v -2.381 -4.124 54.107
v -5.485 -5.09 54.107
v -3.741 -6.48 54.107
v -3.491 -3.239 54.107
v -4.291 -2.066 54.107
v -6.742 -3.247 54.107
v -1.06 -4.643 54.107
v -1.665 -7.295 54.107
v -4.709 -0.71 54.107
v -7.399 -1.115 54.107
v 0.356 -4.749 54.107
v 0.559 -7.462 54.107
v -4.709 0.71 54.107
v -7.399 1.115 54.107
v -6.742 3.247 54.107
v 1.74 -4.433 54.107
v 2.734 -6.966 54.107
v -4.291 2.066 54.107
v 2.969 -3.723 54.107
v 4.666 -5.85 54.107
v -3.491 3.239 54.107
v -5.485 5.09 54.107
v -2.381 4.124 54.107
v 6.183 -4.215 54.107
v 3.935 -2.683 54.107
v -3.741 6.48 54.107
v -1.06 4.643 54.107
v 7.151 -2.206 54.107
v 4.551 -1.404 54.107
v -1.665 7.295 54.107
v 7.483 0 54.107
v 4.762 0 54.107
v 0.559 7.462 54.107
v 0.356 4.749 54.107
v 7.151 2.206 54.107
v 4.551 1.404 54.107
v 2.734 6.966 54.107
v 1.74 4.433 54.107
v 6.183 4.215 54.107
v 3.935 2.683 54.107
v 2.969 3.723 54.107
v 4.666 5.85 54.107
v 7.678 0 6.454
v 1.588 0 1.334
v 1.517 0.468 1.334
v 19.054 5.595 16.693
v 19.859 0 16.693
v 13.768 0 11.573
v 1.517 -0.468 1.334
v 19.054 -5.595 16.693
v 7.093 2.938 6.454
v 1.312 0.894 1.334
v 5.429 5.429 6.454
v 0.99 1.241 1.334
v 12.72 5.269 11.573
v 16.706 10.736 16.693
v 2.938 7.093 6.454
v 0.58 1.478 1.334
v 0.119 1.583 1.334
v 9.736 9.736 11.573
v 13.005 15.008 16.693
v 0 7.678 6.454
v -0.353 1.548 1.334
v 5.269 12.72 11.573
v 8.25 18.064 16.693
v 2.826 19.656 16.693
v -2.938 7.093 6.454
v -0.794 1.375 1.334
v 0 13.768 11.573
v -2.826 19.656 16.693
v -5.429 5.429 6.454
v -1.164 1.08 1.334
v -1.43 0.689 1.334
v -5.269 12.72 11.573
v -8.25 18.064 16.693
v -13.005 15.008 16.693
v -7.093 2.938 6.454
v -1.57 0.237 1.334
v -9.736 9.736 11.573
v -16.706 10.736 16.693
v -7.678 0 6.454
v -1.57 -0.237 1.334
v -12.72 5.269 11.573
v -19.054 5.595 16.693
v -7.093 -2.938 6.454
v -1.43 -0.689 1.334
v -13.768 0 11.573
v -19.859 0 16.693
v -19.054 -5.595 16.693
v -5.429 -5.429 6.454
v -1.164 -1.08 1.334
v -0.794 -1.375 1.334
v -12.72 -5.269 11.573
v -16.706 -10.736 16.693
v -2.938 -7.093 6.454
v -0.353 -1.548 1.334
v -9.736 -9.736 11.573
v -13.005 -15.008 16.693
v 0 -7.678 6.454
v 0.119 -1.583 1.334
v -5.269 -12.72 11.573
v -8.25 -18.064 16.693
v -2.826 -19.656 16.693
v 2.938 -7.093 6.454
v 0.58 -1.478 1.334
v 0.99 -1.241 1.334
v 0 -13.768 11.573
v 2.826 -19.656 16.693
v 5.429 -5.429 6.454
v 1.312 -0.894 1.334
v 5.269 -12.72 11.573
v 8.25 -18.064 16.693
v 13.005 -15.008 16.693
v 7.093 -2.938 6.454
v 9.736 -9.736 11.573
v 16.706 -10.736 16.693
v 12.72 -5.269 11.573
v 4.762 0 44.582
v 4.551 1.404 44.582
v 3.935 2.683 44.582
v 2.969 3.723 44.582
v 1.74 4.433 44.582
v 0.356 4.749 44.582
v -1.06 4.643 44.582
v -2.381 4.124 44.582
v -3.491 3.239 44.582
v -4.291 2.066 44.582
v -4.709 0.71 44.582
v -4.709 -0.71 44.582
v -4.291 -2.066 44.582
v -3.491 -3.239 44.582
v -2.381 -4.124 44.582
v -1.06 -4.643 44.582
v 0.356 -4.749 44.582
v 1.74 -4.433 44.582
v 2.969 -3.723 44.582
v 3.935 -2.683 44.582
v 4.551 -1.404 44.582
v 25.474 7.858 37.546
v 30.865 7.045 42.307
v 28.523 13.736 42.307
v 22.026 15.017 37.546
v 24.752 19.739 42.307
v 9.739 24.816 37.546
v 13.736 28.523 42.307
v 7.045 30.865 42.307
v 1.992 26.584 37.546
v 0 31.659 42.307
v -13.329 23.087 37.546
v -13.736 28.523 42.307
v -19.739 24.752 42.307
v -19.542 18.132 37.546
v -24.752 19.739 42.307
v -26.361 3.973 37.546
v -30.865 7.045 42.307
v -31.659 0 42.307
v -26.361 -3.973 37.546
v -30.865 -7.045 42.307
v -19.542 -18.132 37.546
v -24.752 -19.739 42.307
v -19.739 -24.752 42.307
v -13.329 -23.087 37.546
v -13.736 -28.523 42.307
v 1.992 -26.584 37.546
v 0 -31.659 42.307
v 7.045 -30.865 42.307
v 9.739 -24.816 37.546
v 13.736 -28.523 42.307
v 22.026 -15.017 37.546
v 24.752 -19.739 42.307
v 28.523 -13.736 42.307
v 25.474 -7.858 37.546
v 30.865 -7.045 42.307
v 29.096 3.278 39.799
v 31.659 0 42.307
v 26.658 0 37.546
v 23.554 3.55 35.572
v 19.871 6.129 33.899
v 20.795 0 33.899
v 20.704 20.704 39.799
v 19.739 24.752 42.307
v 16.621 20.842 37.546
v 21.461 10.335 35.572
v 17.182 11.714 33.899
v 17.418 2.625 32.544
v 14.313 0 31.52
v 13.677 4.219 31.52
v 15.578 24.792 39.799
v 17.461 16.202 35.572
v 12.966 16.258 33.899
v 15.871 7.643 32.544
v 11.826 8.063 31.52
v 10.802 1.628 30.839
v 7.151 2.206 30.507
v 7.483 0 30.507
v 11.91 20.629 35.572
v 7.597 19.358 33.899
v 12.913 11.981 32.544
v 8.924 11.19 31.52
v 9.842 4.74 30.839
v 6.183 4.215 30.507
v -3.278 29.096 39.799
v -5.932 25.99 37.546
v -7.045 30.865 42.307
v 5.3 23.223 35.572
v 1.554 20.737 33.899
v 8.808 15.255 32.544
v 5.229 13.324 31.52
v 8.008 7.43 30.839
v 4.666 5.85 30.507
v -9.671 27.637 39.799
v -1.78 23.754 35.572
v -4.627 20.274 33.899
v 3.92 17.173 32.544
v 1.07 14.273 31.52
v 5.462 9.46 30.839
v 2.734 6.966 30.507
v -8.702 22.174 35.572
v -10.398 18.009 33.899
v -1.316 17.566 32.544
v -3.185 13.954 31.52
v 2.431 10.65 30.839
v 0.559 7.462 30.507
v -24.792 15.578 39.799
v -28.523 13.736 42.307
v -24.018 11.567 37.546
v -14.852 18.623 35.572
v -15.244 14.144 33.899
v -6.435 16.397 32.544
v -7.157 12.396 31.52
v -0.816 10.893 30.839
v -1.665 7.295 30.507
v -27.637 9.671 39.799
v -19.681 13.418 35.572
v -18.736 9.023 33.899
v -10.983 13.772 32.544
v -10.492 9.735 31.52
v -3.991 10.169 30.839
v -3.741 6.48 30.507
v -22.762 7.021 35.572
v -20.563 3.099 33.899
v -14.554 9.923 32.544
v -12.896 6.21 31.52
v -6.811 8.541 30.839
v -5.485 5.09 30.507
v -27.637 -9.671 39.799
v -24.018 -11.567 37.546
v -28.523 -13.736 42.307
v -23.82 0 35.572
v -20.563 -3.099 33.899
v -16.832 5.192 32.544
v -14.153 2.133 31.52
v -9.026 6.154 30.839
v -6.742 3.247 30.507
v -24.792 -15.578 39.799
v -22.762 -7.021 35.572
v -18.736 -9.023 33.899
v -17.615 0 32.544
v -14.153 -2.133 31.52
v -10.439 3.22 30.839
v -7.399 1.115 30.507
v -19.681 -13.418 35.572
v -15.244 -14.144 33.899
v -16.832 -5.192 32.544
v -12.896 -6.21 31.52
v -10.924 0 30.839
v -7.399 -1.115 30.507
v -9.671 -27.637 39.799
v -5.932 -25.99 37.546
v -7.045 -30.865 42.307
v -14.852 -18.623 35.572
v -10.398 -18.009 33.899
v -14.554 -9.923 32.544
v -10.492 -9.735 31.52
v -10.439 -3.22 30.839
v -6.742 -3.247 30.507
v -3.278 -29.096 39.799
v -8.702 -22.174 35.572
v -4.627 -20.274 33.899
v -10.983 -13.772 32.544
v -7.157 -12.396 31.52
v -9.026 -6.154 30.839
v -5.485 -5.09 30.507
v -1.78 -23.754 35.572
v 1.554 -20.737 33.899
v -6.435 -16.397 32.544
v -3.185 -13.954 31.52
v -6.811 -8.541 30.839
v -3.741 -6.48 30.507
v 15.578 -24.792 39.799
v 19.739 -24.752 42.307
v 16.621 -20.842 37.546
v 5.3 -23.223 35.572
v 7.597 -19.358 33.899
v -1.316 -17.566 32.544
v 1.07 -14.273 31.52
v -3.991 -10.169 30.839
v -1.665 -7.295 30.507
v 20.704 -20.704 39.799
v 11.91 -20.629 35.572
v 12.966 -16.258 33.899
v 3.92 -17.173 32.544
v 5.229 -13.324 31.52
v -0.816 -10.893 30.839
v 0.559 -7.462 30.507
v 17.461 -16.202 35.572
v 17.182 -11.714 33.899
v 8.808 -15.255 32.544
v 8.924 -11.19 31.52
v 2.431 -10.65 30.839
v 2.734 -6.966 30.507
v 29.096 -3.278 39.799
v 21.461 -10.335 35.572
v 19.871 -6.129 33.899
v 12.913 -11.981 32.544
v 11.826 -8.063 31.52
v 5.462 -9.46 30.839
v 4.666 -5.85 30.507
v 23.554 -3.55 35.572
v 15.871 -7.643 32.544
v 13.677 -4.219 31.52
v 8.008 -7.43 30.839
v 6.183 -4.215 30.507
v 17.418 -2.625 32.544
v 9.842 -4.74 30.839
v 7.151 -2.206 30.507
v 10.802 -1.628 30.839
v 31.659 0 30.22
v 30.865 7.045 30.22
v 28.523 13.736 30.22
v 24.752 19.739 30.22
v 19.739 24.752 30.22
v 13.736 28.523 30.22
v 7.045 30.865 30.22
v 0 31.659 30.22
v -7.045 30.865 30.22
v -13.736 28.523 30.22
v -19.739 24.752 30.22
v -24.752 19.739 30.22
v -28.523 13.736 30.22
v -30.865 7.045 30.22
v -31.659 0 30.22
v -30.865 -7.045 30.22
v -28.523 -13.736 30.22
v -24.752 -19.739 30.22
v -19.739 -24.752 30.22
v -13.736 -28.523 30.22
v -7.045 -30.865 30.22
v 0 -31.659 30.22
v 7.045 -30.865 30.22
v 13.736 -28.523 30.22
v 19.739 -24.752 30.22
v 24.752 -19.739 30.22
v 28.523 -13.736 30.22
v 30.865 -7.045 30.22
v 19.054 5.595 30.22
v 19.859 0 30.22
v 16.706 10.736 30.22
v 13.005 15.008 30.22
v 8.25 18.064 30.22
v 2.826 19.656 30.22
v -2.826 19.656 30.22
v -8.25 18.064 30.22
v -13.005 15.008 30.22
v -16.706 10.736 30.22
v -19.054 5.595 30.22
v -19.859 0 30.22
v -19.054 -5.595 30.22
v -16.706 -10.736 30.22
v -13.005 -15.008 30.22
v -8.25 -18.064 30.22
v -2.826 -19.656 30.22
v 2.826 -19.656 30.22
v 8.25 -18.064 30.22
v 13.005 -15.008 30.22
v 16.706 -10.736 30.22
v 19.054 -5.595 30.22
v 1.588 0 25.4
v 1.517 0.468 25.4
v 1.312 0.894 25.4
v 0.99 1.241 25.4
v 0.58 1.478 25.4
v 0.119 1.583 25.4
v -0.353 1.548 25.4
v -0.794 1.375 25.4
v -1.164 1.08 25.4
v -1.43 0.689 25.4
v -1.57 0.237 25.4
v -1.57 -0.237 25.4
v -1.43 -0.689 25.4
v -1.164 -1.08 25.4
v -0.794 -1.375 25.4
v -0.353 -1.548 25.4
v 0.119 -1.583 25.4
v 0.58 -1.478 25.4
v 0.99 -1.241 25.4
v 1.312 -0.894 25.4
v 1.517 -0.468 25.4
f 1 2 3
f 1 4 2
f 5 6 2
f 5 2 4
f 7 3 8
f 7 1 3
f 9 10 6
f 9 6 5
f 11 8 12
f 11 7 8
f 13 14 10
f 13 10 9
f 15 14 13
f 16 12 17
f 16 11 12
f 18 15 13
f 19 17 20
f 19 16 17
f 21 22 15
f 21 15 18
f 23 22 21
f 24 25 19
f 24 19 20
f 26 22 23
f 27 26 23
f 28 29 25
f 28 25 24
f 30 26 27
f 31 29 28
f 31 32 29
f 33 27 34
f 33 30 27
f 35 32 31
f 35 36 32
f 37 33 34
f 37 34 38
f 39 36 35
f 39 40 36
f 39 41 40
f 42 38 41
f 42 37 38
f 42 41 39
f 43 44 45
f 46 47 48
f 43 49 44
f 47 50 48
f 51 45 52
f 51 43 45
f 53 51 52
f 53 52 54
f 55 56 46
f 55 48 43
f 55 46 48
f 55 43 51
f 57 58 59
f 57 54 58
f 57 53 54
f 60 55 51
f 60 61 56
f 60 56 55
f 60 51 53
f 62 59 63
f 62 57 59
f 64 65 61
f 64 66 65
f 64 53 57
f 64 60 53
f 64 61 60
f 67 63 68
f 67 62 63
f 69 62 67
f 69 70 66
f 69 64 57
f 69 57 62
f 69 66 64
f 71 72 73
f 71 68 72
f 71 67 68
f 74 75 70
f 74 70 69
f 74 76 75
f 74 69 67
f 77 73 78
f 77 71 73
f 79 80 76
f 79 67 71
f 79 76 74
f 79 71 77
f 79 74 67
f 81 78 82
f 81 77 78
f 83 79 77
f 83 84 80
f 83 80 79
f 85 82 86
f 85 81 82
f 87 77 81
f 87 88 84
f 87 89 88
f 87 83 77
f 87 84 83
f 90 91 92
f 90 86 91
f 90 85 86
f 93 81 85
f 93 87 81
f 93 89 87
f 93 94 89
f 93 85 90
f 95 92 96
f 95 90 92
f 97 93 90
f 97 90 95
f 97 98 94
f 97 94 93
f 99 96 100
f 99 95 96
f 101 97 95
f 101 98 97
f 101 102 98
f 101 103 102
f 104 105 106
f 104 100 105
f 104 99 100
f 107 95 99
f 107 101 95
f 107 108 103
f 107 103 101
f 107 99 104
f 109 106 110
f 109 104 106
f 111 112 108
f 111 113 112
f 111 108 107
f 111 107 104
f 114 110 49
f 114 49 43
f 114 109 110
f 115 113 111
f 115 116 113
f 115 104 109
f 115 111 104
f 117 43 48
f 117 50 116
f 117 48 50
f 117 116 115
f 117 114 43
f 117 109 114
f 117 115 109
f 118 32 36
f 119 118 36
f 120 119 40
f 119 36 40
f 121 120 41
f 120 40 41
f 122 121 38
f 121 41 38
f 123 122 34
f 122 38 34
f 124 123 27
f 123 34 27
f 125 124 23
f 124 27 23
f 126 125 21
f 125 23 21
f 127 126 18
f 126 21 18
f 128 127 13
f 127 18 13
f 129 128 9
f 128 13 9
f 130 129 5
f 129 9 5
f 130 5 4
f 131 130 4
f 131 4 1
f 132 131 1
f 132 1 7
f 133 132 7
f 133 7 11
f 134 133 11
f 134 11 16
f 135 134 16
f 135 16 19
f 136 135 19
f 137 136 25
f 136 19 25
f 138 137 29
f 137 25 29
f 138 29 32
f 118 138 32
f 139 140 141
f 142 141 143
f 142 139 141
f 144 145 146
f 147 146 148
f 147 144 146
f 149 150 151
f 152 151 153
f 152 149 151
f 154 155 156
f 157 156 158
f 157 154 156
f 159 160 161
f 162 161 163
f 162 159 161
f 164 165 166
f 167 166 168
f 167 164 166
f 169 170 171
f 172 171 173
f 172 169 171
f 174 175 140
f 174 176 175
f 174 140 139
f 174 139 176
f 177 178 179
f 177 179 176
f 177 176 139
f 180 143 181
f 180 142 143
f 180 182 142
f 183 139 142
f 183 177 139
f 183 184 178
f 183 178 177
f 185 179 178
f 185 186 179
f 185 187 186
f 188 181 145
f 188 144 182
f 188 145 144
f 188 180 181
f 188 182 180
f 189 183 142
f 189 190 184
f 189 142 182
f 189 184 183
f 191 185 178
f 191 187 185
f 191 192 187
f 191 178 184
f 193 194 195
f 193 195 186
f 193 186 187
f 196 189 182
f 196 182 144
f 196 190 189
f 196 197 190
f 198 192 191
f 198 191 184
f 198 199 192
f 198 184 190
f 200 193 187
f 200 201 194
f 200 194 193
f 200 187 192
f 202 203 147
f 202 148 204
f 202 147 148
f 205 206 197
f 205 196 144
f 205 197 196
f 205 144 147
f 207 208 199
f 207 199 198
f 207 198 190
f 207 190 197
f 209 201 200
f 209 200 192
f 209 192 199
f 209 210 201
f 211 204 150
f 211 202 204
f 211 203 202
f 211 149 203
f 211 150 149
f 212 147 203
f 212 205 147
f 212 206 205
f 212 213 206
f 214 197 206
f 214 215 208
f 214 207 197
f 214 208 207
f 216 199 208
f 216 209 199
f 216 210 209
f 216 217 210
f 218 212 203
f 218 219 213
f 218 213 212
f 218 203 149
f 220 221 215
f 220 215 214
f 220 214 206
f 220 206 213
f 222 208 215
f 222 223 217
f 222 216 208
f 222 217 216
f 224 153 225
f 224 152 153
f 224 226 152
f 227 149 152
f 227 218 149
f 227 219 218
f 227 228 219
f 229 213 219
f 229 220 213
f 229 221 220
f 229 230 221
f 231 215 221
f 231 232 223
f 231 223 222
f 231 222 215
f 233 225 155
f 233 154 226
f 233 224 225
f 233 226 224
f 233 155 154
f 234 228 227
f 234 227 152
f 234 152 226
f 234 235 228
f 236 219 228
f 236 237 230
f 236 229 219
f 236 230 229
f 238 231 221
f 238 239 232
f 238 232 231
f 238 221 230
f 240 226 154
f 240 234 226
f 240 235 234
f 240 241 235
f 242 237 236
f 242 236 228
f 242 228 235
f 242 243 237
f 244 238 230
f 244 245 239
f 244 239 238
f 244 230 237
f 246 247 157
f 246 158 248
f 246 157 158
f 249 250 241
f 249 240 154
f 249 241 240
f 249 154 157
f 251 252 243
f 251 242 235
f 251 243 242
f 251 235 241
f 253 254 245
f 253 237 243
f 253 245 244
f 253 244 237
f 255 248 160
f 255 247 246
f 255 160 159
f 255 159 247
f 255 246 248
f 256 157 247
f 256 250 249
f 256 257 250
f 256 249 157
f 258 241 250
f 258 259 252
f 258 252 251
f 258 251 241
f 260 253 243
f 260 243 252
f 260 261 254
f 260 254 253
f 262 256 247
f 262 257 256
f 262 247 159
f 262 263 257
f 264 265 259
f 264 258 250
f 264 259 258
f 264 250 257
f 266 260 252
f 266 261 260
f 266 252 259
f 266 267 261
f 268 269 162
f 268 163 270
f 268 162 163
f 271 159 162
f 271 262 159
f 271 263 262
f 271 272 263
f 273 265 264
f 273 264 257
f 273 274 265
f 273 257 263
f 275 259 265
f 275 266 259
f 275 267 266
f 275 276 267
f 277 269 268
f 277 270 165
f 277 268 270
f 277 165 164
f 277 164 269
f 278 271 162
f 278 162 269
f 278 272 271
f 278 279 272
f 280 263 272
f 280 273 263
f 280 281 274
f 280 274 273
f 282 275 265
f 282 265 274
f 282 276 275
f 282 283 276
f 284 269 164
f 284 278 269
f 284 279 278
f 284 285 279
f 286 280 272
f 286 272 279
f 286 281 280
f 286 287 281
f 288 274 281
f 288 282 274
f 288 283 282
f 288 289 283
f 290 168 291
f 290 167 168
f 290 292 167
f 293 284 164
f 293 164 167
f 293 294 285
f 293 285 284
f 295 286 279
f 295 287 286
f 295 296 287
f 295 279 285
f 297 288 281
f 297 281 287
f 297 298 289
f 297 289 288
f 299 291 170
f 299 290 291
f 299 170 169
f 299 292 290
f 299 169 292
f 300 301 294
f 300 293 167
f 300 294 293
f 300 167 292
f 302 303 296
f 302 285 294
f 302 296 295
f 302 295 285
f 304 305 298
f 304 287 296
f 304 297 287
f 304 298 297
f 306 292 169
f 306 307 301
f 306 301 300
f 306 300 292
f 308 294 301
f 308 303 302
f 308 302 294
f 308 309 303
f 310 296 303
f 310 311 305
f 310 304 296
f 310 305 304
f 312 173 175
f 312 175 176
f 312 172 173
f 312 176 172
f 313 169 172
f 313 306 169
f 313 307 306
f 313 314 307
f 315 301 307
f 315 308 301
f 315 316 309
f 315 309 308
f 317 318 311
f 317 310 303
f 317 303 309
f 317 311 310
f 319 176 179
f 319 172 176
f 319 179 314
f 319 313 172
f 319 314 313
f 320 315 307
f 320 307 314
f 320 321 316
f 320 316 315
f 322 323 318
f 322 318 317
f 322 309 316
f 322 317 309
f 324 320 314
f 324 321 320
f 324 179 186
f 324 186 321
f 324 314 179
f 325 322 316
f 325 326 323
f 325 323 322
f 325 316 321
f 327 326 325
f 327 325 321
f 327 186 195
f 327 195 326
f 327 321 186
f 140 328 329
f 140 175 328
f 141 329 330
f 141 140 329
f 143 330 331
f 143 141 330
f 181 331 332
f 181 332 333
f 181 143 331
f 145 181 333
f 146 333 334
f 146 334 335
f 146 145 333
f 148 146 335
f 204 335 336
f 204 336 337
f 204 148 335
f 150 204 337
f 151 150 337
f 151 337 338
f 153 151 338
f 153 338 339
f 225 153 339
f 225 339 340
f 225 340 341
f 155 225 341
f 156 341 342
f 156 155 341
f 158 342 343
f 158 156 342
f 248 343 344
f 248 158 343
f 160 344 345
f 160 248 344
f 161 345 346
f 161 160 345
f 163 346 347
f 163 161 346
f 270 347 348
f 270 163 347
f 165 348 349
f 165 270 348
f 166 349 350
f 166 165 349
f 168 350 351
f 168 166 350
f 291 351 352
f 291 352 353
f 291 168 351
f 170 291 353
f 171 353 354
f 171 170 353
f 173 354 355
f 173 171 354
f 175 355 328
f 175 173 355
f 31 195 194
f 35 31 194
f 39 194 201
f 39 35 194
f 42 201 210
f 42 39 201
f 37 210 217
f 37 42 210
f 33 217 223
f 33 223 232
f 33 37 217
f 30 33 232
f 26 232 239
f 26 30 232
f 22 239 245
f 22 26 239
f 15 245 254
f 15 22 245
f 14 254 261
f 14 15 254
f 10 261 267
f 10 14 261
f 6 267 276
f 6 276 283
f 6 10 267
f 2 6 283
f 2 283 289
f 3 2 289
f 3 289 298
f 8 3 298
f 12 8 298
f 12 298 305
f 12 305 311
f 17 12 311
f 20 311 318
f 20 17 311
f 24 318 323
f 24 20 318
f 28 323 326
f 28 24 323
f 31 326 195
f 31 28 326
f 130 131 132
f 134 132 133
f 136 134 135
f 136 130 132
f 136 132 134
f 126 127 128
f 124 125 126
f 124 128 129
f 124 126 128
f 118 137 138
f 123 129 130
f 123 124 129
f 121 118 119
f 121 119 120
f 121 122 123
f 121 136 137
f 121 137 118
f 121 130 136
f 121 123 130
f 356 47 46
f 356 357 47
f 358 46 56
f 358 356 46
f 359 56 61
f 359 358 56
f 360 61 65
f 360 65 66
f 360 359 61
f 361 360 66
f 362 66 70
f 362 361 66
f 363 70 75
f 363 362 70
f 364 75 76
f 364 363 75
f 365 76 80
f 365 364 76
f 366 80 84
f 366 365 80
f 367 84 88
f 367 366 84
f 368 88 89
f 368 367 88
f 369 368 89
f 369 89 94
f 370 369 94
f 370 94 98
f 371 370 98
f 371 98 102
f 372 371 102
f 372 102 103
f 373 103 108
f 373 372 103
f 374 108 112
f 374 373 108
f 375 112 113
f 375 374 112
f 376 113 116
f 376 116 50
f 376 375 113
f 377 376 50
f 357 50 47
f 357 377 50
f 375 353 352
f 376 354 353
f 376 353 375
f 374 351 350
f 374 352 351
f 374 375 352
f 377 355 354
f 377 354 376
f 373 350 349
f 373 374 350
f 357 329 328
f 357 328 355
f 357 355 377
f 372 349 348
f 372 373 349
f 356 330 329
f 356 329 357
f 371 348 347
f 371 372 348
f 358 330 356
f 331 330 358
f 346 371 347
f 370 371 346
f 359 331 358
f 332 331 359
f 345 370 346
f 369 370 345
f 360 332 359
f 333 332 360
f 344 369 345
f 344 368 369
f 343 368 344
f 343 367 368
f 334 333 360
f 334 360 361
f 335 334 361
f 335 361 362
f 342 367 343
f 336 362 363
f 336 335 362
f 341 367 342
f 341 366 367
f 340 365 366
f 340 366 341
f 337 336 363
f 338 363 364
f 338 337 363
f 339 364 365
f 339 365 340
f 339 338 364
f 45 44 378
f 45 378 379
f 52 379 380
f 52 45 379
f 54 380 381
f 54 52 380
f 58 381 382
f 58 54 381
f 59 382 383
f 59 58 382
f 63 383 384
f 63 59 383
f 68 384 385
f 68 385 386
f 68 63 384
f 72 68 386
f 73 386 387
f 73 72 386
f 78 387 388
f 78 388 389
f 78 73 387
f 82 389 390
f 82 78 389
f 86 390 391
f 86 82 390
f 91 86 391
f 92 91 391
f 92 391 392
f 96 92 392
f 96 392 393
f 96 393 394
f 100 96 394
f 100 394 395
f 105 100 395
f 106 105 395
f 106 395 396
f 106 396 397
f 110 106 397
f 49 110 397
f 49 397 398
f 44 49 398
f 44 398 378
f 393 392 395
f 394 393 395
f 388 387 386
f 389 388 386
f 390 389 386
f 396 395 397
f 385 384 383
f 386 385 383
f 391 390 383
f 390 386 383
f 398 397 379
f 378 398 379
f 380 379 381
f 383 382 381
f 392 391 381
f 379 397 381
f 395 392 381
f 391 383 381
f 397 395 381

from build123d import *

# Parameters (mm, degrees)
F2_R     = 4.7625
F3_DEPTH = 9.525
F4_R     = 1.5875
F5_DEPTH = 25.4


with BuildPart() as f1:
    # F0 (on Front) → F1 (revolve)
    with BuildSketch(Plane.XZ):
        with BuildLine():
            Line((0, 54.107483), (0, 0))
            Line((0, 0), (19.858597, 16.692733))
            Line((19.858597, 16.692733), (19.858597, 30.219605))
            Line((19.858597, 30.219605), (31.658631, 30.219605))
            Line((31.658631, 30.219605), (31.658631, 42.307448))
            ThreePointArc((31.658631, 42.307448), (20.795094, 33.8991), (7.48295, 30.50741))
            Line((7.48295, 30.50741), (7.48295, 54.107483))
            Line((7.48295, 54.107483), (0, 54.107483))
        make_face()
    revolve(axis=Axis((0, 0, 27.053742), (0, 0, 1)))

    # F2 (on face) → F3 (cut)
    with BuildSketch(Plane.XY.offset(54.107483)):
        Circle(F2_R)
    extrude(amount=-F3_DEPTH, mode=Mode.SUBTRACT)

    # F4 (on Top) → F5 (cut)
    with BuildSketch(Plane.XY):
        Circle(F4_R)
    extrude(amount=F5_DEPTH, mode=Mode.SUBTRACT)


solid = f1.part
